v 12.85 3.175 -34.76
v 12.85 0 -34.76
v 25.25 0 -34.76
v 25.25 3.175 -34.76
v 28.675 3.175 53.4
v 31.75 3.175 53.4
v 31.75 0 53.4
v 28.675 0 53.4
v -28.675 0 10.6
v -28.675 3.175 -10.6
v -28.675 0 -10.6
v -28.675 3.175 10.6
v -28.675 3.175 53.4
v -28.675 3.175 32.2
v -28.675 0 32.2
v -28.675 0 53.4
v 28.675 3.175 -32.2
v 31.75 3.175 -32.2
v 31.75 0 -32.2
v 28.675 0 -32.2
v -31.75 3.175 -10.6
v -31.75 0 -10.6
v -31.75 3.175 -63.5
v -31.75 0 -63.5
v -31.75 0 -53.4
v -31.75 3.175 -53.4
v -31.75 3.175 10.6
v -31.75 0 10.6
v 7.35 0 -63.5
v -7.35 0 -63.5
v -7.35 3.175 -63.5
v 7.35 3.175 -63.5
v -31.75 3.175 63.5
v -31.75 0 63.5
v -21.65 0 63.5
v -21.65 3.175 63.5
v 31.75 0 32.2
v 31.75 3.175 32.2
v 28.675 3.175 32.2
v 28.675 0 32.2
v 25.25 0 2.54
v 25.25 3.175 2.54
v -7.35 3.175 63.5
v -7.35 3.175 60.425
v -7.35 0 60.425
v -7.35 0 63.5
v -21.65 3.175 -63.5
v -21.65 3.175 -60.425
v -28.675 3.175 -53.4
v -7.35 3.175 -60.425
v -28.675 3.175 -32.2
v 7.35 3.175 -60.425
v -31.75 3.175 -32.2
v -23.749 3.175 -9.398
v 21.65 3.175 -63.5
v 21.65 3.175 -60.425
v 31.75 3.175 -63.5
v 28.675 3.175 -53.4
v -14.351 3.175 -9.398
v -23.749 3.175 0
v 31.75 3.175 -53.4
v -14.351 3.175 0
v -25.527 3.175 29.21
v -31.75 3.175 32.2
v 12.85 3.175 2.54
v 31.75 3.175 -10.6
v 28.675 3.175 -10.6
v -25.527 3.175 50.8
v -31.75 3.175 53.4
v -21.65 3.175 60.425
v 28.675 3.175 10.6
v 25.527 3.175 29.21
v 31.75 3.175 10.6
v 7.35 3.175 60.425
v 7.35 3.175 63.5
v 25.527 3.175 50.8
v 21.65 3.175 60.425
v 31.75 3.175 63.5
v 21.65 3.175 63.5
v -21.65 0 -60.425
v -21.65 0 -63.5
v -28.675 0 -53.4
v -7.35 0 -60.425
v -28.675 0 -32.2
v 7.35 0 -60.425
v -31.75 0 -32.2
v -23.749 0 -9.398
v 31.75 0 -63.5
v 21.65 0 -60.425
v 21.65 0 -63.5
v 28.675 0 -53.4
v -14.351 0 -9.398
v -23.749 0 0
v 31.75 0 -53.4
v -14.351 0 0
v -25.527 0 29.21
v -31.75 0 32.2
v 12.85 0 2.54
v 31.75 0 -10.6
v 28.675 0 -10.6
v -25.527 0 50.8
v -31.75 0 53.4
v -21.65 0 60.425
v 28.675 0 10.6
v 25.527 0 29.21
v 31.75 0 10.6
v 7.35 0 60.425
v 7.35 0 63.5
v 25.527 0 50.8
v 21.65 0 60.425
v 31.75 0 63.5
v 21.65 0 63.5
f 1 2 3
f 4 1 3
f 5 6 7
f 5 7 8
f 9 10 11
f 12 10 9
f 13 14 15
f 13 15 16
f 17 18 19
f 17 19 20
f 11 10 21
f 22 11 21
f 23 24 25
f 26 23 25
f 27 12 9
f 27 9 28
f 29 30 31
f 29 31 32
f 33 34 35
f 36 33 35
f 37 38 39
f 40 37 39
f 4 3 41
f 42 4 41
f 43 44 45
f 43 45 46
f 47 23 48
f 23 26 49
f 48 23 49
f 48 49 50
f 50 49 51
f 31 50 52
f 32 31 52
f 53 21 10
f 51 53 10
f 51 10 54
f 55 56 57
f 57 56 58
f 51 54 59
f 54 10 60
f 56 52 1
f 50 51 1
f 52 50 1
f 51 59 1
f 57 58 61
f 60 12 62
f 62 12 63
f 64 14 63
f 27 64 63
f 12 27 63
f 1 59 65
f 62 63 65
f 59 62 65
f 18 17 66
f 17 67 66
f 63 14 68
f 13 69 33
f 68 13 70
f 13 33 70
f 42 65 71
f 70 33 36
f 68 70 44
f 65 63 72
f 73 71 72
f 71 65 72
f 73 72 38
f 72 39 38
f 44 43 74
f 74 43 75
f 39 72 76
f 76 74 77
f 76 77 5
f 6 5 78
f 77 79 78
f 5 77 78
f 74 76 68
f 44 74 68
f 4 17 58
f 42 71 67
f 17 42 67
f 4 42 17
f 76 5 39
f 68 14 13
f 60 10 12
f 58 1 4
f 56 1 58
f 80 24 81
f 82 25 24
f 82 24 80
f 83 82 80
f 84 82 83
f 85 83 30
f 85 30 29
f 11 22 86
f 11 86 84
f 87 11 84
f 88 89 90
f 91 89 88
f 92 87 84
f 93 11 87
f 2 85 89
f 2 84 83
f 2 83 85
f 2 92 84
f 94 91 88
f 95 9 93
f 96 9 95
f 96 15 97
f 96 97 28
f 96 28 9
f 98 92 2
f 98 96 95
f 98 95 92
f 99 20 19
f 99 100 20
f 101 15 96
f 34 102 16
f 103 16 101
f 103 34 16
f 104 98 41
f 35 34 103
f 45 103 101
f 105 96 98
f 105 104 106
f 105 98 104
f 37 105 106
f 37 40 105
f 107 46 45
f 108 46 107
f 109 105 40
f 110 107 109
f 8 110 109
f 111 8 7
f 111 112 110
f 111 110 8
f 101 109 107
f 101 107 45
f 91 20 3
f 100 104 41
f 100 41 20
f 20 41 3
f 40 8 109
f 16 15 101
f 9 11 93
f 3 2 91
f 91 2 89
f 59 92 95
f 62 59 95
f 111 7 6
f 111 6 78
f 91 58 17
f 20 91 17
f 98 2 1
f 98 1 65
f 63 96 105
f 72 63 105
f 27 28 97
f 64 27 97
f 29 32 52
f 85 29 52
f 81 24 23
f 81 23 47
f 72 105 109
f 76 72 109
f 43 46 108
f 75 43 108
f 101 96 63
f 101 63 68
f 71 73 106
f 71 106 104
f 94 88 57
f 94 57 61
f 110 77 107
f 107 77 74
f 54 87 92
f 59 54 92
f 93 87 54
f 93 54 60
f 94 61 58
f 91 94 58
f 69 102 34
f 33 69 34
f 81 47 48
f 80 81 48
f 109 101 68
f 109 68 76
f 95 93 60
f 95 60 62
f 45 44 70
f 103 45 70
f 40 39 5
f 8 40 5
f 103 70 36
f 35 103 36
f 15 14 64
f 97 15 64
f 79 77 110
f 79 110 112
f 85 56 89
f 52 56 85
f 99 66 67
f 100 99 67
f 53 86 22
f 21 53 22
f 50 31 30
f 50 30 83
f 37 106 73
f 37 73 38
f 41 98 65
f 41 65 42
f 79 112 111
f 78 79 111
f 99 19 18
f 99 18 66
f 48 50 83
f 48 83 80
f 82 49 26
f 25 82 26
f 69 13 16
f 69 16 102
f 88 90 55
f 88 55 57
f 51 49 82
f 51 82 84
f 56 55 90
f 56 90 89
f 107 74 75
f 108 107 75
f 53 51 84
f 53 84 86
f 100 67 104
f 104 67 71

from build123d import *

# Parameters (mm, degrees)
F0_W     = 63.5
F0_H     = 127
F0_W_2   = 9.398
F0_H_2   = 9.398
F0_W_3   = 12.4
F0_H_3   = 37.3
F0_W_4   = 51.054
F0_H_4   = 21.59
F1_DEPTH = 3.175
F2_W     = 14.3
F2_H     = 3.075
F2_W_2   = 3.075
F2_H_2   = 21.2
F3_DEPTH = 25


# Not quite as in the source:
# - a feature of the source that left no trace in its solid (it failed there, or was rolled back) is left out
# - a length typed as a fraction of an inch, garbled in the dataset ("3 / 203.2 mm" for 3/8 in), is restored


with BuildPart() as f1:
    # F0 (on Front) → F1 (new body)
    with BuildSketch(Plane.XZ):
        Rectangle(F0_W, F0_H)
        with Locations((-19.05, -4.699)):
            Rectangle(F0_W_2, F0_H_2, mode=Mode.SUBTRACT)
        with Locations((19.05, -16.11)):
            Rectangle(F0_W_3, F0_H_3, mode=Mode.SUBTRACT)
        with Locations((0, 40.005)):
            Rectangle(F0_W_4, F0_H_4, mode=Mode.SUBTRACT)
    extrude(amount=-F1_DEPTH)

    # F2 (on face) → F3 (cut)
    with BuildSketch(Plane(origin=(0, 3.175, 0), x_dir=(-1, 0, 0), z_dir=(0, 1, 0))):
        with Locations((14.5, 61.9625)):
            Rectangle(F2_W, F2_H)
        with Locations((-14.5, 61.9625)):
            Rectangle(F2_W, F2_H)
        with Locations((-30.2125, -42.8)):
            Rectangle(F2_W_2, F2_H_2)
        with Locations((-30.2125, 0)):
            Rectangle(F2_W_2, F2_H_2)
        with Locations((-30.2125, 42.8)):
            Rectangle(F2_W_2, F2_H_2)
        with Locations((30.2125, -42.8)):
            Rectangle(F2_W_2, F2_H_2)
        with Locations((30.2125, 0)):
            Rectangle(F2_W_2, F2_H_2)
        with Locations((30.2125, 42.8)):
            Rectangle(F2_W_2, F2_H_2)
        with Locations((-14.5, -61.9625)):
            Rectangle(F2_W, F2_H)
        with Locations((14.5, -61.9625)):
            Rectangle(F2_W, F2_H)
    extrude(amount=-F3_DEPTH, mode=Mode.SUBTRACT)


solid = f1.part
